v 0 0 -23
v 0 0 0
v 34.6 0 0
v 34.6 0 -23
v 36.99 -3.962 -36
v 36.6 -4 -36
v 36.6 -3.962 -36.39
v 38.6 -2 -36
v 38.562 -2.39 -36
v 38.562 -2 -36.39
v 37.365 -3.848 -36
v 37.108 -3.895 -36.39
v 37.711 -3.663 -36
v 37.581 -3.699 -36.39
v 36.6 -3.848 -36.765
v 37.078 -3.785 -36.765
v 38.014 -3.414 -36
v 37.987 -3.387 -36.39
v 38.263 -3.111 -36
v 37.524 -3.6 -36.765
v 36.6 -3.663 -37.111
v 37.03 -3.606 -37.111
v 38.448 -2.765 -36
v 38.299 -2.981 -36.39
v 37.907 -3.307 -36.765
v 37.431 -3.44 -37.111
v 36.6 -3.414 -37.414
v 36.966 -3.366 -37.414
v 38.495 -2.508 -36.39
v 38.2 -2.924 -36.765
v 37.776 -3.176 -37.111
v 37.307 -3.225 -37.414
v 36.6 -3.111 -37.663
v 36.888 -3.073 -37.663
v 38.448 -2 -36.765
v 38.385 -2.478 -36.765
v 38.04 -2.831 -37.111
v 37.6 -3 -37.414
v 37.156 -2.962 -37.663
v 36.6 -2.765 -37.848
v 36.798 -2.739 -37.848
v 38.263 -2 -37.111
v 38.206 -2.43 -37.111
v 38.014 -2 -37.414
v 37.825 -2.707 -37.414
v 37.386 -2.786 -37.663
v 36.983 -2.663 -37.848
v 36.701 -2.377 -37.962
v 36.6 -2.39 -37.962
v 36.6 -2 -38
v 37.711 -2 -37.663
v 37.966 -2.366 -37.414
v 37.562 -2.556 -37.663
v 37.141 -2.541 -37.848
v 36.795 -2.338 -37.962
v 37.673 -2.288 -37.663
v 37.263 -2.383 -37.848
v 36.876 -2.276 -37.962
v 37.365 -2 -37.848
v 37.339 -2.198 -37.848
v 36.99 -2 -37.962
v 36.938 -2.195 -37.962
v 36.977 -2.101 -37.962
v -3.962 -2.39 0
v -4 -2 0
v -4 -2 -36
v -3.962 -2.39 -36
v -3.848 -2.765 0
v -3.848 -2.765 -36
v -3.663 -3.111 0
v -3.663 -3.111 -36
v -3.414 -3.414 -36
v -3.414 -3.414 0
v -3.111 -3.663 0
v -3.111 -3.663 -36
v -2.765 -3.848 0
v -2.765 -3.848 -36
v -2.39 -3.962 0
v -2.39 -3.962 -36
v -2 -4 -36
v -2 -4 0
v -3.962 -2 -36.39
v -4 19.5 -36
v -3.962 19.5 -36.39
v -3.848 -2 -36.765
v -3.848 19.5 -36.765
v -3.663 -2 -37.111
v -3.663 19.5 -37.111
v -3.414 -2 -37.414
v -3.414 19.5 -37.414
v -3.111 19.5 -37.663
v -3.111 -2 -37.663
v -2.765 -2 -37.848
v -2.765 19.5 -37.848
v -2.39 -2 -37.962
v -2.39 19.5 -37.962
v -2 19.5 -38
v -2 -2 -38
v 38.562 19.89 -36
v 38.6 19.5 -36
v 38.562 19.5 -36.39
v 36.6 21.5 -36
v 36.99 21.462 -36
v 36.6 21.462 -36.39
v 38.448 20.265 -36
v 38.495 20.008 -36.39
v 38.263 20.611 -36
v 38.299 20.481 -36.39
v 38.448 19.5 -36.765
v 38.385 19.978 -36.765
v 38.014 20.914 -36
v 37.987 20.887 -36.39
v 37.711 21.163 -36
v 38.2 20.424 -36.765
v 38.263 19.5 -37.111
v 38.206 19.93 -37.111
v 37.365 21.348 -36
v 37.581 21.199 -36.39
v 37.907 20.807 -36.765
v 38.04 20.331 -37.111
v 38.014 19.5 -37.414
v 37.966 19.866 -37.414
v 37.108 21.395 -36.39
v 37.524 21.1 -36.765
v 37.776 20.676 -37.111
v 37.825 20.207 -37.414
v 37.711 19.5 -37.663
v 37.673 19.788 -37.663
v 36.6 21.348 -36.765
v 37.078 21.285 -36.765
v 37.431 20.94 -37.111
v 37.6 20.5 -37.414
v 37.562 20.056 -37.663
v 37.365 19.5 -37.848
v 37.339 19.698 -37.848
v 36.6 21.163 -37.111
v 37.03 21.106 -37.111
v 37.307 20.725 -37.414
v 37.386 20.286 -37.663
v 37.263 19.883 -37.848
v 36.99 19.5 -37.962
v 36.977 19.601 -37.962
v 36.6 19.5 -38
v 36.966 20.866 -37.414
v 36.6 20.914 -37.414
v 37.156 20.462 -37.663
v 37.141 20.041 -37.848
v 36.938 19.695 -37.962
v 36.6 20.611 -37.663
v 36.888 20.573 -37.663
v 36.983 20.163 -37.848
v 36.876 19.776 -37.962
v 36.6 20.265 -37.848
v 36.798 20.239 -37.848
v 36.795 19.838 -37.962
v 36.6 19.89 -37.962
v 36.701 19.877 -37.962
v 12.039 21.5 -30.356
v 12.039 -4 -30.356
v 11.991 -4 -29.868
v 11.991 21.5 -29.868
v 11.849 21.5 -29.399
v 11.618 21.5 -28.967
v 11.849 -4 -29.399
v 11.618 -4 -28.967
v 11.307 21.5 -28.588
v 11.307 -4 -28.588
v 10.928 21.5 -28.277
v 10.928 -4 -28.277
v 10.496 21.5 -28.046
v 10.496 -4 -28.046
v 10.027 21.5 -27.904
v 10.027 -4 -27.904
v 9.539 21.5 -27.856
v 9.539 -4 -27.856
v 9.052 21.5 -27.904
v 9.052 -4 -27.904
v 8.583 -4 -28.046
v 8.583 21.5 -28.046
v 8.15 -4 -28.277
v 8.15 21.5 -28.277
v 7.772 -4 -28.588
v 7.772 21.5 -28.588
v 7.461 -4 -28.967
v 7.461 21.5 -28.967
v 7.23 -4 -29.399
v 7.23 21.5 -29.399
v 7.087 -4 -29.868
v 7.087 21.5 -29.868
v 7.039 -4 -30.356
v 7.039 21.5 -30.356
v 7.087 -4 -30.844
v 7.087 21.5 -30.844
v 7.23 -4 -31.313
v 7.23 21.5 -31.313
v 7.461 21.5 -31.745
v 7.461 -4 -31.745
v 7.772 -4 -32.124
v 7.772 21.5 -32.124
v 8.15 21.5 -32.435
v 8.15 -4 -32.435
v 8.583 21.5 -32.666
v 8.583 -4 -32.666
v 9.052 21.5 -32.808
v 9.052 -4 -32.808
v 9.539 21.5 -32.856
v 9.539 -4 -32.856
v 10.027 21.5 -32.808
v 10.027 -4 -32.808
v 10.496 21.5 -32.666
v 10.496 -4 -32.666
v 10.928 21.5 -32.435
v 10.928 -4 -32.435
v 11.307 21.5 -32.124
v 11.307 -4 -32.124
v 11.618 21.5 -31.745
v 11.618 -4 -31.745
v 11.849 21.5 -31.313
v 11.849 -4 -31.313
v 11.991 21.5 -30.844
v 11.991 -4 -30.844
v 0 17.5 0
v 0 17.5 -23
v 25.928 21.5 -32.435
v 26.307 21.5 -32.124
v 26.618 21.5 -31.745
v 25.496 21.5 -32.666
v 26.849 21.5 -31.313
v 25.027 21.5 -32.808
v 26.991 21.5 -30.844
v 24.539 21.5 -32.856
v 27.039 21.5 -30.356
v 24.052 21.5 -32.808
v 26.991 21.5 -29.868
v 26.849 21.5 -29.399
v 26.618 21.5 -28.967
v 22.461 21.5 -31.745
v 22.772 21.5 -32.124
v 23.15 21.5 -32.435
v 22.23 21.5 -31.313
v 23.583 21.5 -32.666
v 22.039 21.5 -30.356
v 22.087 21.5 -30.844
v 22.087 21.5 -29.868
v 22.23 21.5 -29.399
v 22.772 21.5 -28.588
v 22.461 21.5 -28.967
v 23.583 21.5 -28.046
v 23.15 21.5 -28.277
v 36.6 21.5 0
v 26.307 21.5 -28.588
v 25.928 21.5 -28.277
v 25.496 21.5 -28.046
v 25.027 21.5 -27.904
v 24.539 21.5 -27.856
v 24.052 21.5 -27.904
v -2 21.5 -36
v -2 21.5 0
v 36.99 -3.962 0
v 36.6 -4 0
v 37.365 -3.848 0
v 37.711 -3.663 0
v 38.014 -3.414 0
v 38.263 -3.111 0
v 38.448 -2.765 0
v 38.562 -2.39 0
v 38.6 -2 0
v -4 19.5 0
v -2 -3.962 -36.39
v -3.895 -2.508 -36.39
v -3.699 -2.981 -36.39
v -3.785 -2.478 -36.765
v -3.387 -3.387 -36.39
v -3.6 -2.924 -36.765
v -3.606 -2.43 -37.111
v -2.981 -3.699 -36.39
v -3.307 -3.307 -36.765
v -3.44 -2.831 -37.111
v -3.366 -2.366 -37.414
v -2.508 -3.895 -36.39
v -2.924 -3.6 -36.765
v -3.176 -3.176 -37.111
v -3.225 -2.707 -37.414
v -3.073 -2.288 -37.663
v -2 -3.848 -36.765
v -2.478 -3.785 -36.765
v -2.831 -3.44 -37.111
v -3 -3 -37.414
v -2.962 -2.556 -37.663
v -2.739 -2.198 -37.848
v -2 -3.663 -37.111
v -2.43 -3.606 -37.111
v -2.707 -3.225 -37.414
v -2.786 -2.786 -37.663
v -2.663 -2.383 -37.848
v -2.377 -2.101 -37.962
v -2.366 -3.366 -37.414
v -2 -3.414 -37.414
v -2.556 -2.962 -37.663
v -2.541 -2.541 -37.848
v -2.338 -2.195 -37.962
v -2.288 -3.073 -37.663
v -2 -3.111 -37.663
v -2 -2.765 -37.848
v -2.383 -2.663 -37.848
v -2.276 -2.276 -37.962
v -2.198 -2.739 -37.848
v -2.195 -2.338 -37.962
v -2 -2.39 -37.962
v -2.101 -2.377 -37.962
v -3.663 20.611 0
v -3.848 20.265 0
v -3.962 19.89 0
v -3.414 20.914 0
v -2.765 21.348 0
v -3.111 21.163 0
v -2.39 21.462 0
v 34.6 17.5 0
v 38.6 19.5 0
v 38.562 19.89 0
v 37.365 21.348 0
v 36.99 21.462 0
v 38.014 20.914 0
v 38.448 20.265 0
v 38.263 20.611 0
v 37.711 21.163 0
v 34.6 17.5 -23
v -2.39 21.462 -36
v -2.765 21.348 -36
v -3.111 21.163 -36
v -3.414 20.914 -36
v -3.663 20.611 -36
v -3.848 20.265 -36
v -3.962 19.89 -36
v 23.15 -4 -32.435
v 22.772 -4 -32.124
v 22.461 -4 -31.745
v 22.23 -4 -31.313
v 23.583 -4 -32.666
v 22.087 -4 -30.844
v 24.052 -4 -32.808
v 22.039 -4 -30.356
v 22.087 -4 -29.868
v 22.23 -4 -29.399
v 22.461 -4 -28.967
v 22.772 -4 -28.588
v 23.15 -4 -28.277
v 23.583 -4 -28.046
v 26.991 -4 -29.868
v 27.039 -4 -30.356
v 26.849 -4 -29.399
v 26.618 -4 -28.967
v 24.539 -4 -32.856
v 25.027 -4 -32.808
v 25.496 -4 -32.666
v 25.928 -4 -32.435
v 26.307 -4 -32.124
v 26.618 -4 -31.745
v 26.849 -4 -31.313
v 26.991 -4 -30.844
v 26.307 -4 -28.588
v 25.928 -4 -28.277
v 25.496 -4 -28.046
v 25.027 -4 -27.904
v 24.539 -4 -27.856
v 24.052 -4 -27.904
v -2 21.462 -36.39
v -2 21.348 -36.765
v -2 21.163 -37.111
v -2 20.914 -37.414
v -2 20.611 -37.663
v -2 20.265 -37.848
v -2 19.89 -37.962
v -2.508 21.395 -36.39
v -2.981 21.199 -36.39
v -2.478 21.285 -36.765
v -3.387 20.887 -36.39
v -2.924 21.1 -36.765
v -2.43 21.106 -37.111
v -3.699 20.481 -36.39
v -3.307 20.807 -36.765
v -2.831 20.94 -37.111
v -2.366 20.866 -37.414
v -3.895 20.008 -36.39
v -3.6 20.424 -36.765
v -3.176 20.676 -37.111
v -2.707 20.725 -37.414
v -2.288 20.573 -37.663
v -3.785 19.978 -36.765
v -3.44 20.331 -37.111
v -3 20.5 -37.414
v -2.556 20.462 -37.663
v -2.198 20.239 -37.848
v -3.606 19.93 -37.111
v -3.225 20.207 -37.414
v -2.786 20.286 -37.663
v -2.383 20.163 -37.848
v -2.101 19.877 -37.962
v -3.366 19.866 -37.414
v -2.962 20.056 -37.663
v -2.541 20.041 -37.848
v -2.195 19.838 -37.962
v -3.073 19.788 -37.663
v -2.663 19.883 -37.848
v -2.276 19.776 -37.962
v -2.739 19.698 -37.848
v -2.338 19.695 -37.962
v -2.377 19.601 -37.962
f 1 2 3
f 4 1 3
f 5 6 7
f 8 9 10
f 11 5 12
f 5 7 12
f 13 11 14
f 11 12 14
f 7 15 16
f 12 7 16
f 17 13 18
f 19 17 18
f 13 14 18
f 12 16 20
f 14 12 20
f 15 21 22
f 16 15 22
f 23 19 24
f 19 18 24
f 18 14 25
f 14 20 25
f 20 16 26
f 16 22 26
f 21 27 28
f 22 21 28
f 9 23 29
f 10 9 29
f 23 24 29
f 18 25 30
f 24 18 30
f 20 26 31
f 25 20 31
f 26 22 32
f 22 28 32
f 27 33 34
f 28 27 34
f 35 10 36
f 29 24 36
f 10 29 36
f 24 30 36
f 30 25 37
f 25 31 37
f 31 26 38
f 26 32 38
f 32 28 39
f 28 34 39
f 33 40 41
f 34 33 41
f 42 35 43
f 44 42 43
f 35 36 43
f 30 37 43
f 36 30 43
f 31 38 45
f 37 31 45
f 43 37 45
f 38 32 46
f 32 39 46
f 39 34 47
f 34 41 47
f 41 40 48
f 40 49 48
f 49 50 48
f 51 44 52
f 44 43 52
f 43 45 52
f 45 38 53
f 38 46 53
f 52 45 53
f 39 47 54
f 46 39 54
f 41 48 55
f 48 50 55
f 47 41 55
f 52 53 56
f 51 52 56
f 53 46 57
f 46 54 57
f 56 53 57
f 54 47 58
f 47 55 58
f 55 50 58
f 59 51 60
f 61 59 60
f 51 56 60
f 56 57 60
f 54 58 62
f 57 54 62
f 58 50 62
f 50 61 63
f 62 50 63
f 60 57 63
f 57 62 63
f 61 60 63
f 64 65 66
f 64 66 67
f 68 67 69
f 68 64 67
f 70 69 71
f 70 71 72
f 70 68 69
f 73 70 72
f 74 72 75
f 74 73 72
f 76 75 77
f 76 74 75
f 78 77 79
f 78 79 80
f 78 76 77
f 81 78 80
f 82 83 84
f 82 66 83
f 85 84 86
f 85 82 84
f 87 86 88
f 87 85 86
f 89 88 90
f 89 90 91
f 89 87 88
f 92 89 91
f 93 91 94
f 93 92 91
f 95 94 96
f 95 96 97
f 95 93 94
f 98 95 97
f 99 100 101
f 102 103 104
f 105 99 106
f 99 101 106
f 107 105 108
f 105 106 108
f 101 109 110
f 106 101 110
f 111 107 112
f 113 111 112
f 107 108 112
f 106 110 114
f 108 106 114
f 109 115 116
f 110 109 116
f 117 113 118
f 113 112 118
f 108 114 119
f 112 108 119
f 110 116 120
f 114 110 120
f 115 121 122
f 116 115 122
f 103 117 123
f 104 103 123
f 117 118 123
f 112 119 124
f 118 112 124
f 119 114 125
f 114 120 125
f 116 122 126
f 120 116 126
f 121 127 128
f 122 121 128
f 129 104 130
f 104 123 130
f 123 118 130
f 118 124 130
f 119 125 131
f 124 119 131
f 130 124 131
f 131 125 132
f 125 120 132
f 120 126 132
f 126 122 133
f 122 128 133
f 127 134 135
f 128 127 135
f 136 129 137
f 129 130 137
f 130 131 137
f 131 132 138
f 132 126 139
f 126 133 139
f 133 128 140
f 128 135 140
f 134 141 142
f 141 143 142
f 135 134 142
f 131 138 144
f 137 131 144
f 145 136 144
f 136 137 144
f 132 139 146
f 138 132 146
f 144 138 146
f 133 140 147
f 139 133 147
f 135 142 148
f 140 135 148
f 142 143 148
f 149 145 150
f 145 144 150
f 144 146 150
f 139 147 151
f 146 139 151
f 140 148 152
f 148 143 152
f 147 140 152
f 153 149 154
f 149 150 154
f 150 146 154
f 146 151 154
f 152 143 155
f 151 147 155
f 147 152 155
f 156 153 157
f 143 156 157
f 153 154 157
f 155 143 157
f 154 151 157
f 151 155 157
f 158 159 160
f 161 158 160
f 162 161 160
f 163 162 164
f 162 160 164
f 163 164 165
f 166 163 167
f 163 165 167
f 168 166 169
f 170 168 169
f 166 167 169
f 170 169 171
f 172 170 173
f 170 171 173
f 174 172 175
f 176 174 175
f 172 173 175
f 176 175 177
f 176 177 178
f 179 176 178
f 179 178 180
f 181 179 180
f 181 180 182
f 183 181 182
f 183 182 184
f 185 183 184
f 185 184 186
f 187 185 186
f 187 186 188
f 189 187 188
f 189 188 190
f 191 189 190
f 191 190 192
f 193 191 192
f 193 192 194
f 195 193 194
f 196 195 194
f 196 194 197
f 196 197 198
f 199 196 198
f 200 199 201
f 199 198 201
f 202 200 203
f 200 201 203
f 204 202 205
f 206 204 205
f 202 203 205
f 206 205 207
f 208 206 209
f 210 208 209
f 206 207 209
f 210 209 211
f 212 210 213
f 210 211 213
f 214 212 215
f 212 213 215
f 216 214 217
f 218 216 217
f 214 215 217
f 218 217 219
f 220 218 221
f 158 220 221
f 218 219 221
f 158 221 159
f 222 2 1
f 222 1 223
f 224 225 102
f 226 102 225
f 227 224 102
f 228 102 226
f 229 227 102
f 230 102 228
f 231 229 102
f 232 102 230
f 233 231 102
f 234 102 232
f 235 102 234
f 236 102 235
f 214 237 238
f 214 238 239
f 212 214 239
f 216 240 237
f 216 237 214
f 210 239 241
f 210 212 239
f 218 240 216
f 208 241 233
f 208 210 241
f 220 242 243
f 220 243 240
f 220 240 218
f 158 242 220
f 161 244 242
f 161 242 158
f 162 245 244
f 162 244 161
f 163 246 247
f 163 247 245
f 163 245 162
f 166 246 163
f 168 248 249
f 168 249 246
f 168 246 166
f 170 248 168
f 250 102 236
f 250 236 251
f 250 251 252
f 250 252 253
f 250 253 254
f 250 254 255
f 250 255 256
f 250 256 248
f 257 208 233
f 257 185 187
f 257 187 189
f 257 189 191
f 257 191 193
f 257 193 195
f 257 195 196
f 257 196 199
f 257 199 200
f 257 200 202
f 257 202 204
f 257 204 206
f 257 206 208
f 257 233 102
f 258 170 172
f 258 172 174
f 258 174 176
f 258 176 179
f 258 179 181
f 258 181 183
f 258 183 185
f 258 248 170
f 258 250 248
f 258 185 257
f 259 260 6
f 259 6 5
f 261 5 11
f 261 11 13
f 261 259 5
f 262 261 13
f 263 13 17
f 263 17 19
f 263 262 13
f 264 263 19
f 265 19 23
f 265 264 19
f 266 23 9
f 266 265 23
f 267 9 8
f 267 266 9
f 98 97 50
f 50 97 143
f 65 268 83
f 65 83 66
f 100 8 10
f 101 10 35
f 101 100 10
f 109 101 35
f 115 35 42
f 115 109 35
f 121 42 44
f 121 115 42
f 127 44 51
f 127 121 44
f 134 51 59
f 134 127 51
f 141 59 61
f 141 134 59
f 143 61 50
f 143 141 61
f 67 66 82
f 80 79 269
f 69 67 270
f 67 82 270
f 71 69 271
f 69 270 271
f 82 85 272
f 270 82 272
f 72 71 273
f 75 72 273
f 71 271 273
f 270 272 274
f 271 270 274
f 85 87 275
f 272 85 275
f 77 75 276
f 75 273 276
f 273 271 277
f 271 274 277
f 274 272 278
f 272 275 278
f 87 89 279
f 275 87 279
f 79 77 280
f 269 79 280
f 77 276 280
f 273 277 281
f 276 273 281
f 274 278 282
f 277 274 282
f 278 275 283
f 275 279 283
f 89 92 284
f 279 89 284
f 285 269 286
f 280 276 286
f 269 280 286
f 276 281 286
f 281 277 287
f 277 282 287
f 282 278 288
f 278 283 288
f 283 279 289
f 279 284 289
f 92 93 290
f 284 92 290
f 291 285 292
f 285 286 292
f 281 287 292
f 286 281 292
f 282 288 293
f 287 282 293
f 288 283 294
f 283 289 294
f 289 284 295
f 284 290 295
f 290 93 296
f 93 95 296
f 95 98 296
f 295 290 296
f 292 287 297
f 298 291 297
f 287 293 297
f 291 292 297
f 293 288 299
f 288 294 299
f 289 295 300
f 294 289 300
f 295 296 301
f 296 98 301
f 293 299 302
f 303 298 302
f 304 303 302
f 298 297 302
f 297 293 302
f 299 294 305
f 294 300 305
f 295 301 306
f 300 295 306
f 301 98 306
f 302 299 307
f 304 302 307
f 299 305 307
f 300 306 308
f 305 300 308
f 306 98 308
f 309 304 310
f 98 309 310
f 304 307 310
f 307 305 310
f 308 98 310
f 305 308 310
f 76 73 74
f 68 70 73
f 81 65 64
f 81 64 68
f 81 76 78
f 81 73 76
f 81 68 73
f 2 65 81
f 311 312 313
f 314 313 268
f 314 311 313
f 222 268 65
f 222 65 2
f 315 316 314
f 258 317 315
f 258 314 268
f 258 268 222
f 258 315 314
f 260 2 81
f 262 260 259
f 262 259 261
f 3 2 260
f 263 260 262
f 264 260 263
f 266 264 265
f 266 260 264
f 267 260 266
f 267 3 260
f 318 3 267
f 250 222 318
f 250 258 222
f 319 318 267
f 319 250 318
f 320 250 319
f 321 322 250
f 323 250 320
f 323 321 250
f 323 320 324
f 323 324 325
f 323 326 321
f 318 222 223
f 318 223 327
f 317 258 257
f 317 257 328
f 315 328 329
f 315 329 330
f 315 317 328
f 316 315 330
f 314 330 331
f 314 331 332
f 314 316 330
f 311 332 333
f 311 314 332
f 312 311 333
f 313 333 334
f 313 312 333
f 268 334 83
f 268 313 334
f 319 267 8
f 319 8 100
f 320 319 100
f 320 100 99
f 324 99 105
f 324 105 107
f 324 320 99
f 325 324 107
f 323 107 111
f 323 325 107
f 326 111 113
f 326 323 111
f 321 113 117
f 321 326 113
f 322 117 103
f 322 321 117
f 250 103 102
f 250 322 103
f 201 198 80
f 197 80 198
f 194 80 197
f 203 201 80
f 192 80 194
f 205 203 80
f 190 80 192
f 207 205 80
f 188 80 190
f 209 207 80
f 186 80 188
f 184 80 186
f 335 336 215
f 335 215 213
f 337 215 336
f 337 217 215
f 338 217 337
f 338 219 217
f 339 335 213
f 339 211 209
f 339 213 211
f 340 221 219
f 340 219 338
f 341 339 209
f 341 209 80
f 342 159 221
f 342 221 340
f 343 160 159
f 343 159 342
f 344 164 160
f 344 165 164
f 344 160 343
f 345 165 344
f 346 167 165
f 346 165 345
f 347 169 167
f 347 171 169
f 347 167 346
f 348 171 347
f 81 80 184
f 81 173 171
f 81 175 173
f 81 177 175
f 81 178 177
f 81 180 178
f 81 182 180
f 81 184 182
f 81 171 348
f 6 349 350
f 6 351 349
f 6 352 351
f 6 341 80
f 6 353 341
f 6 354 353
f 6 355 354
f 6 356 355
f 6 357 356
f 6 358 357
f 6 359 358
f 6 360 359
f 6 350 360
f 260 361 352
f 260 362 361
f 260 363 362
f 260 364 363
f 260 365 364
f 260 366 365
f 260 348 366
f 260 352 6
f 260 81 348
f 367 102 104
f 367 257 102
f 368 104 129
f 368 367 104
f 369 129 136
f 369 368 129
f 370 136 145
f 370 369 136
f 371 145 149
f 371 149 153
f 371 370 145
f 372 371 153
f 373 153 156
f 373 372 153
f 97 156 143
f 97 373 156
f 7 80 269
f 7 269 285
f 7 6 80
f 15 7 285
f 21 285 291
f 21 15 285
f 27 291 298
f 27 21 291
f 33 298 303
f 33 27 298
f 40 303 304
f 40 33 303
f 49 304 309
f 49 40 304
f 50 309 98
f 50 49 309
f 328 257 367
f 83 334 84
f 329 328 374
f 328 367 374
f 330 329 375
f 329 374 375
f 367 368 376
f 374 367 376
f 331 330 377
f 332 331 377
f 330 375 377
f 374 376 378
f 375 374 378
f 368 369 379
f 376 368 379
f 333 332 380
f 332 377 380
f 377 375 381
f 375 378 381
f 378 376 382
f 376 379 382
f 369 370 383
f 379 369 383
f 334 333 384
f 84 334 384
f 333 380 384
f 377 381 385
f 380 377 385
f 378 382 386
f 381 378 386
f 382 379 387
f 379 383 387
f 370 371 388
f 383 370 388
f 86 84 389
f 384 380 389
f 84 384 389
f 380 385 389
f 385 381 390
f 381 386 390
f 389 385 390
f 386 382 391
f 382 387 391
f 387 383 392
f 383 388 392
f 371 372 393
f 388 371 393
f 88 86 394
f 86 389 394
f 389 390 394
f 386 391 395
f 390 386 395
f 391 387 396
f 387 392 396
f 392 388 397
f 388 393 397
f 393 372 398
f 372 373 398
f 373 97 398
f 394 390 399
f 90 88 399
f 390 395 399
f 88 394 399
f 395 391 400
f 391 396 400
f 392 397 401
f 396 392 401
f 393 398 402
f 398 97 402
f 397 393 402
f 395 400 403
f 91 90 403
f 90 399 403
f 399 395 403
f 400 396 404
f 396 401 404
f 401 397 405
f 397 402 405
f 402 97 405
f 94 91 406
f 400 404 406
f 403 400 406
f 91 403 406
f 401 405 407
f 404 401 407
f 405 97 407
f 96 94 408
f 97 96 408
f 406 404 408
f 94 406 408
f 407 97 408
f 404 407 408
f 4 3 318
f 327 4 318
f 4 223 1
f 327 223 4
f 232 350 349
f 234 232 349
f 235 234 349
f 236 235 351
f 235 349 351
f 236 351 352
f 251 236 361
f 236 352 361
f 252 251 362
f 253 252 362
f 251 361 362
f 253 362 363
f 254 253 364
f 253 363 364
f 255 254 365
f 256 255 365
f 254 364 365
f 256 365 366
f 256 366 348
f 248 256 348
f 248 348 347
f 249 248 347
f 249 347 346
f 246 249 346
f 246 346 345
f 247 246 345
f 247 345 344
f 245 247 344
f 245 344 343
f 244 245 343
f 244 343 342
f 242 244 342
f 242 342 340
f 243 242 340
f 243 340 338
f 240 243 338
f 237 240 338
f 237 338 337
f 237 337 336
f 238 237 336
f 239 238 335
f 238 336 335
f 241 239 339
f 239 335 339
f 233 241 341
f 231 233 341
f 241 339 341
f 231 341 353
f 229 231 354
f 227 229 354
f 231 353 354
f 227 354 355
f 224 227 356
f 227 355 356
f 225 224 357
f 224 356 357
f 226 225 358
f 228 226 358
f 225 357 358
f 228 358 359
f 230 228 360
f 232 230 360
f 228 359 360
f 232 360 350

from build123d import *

# Parameters (mm, degrees)
F0_W     = 34.6
F0_H     = 17.5
F1_DEPTH = 38
F2_DEPTH = 23
F3_R     = 2.5
F4_DEPTH = 25.501001
F5_R     = 2


with BuildPart() as f1:
    # F0 (on Top) → F1 (new body)
    with BuildSketch(Plane.XY):
        with BuildLine():
            Line((36.600001, 21.500001), (-2.000001, 21.500001))
            ThreePointArc((-2.000001, 21.500001), (-3.414214, 20.914214), (-4.000001, 19.500001))
            Line((-4.000001, 19.500001), (-4.000001, -2.000001))
            ThreePointArc((-4.000001, -2.000001), (-3.414214, -3.414214), (-2.000001, -4.000001))
            Line((-2.000001, -4.000001), (36.600001, -4.000001))
            ThreePointArc((36.600001, -4.000001), (38.014214, -3.414214), (38.600001, -2.000001))
            Line((38.600001, -2.000001), (38.600001, 19.500001))
            ThreePointArc((38.600001, 19.500001), (38.014214, 20.914214), (36.600001, 21.500001))
        make_face()
        with Locations((17.3, 8.75)):
            Rectangle(F0_W, F0_H, mode=Mode.SUBTRACT)
        with Locations((17.3, 8.75)):
            Rectangle(F0_W, F0_H)
    extrude(amount=-F1_DEPTH)

    # F0 (on Top) → F2 (cut)
    with BuildSketch(Plane.XY):
        with Locations((17.3, 8.75)):
            Rectangle(F0_W, F0_H)
    extrude(amount=-F2_DEPTH, mode=Mode.SUBTRACT)

    # F3 (on face) → F4 (cut, through all)
    with BuildSketch(Plane.XZ.offset(4.000001)):
        with BuildLine():
            ThreePointArc((22.039303, -30.356017), (24.539303, -32.856017), (27.039303, -30.356017))
            ThreePointArc((27.039303, -30.356017), (24.539303, -27.856017), (22.039303, -30.356017))
        make_face()
        with Locations((9.539303, -30.356017)):
            Circle(F3_R)
    extrude(amount=-F4_DEPTH, mode=Mode.SUBTRACT)

    # F5
    f5_edges = [f1.edges().sort_by_distance(p)[0] for p in [
        (17.3, 21.500001, -38),
    ]]
    fillet(f5_edges, radius=F5_R)


solid = f1.part
